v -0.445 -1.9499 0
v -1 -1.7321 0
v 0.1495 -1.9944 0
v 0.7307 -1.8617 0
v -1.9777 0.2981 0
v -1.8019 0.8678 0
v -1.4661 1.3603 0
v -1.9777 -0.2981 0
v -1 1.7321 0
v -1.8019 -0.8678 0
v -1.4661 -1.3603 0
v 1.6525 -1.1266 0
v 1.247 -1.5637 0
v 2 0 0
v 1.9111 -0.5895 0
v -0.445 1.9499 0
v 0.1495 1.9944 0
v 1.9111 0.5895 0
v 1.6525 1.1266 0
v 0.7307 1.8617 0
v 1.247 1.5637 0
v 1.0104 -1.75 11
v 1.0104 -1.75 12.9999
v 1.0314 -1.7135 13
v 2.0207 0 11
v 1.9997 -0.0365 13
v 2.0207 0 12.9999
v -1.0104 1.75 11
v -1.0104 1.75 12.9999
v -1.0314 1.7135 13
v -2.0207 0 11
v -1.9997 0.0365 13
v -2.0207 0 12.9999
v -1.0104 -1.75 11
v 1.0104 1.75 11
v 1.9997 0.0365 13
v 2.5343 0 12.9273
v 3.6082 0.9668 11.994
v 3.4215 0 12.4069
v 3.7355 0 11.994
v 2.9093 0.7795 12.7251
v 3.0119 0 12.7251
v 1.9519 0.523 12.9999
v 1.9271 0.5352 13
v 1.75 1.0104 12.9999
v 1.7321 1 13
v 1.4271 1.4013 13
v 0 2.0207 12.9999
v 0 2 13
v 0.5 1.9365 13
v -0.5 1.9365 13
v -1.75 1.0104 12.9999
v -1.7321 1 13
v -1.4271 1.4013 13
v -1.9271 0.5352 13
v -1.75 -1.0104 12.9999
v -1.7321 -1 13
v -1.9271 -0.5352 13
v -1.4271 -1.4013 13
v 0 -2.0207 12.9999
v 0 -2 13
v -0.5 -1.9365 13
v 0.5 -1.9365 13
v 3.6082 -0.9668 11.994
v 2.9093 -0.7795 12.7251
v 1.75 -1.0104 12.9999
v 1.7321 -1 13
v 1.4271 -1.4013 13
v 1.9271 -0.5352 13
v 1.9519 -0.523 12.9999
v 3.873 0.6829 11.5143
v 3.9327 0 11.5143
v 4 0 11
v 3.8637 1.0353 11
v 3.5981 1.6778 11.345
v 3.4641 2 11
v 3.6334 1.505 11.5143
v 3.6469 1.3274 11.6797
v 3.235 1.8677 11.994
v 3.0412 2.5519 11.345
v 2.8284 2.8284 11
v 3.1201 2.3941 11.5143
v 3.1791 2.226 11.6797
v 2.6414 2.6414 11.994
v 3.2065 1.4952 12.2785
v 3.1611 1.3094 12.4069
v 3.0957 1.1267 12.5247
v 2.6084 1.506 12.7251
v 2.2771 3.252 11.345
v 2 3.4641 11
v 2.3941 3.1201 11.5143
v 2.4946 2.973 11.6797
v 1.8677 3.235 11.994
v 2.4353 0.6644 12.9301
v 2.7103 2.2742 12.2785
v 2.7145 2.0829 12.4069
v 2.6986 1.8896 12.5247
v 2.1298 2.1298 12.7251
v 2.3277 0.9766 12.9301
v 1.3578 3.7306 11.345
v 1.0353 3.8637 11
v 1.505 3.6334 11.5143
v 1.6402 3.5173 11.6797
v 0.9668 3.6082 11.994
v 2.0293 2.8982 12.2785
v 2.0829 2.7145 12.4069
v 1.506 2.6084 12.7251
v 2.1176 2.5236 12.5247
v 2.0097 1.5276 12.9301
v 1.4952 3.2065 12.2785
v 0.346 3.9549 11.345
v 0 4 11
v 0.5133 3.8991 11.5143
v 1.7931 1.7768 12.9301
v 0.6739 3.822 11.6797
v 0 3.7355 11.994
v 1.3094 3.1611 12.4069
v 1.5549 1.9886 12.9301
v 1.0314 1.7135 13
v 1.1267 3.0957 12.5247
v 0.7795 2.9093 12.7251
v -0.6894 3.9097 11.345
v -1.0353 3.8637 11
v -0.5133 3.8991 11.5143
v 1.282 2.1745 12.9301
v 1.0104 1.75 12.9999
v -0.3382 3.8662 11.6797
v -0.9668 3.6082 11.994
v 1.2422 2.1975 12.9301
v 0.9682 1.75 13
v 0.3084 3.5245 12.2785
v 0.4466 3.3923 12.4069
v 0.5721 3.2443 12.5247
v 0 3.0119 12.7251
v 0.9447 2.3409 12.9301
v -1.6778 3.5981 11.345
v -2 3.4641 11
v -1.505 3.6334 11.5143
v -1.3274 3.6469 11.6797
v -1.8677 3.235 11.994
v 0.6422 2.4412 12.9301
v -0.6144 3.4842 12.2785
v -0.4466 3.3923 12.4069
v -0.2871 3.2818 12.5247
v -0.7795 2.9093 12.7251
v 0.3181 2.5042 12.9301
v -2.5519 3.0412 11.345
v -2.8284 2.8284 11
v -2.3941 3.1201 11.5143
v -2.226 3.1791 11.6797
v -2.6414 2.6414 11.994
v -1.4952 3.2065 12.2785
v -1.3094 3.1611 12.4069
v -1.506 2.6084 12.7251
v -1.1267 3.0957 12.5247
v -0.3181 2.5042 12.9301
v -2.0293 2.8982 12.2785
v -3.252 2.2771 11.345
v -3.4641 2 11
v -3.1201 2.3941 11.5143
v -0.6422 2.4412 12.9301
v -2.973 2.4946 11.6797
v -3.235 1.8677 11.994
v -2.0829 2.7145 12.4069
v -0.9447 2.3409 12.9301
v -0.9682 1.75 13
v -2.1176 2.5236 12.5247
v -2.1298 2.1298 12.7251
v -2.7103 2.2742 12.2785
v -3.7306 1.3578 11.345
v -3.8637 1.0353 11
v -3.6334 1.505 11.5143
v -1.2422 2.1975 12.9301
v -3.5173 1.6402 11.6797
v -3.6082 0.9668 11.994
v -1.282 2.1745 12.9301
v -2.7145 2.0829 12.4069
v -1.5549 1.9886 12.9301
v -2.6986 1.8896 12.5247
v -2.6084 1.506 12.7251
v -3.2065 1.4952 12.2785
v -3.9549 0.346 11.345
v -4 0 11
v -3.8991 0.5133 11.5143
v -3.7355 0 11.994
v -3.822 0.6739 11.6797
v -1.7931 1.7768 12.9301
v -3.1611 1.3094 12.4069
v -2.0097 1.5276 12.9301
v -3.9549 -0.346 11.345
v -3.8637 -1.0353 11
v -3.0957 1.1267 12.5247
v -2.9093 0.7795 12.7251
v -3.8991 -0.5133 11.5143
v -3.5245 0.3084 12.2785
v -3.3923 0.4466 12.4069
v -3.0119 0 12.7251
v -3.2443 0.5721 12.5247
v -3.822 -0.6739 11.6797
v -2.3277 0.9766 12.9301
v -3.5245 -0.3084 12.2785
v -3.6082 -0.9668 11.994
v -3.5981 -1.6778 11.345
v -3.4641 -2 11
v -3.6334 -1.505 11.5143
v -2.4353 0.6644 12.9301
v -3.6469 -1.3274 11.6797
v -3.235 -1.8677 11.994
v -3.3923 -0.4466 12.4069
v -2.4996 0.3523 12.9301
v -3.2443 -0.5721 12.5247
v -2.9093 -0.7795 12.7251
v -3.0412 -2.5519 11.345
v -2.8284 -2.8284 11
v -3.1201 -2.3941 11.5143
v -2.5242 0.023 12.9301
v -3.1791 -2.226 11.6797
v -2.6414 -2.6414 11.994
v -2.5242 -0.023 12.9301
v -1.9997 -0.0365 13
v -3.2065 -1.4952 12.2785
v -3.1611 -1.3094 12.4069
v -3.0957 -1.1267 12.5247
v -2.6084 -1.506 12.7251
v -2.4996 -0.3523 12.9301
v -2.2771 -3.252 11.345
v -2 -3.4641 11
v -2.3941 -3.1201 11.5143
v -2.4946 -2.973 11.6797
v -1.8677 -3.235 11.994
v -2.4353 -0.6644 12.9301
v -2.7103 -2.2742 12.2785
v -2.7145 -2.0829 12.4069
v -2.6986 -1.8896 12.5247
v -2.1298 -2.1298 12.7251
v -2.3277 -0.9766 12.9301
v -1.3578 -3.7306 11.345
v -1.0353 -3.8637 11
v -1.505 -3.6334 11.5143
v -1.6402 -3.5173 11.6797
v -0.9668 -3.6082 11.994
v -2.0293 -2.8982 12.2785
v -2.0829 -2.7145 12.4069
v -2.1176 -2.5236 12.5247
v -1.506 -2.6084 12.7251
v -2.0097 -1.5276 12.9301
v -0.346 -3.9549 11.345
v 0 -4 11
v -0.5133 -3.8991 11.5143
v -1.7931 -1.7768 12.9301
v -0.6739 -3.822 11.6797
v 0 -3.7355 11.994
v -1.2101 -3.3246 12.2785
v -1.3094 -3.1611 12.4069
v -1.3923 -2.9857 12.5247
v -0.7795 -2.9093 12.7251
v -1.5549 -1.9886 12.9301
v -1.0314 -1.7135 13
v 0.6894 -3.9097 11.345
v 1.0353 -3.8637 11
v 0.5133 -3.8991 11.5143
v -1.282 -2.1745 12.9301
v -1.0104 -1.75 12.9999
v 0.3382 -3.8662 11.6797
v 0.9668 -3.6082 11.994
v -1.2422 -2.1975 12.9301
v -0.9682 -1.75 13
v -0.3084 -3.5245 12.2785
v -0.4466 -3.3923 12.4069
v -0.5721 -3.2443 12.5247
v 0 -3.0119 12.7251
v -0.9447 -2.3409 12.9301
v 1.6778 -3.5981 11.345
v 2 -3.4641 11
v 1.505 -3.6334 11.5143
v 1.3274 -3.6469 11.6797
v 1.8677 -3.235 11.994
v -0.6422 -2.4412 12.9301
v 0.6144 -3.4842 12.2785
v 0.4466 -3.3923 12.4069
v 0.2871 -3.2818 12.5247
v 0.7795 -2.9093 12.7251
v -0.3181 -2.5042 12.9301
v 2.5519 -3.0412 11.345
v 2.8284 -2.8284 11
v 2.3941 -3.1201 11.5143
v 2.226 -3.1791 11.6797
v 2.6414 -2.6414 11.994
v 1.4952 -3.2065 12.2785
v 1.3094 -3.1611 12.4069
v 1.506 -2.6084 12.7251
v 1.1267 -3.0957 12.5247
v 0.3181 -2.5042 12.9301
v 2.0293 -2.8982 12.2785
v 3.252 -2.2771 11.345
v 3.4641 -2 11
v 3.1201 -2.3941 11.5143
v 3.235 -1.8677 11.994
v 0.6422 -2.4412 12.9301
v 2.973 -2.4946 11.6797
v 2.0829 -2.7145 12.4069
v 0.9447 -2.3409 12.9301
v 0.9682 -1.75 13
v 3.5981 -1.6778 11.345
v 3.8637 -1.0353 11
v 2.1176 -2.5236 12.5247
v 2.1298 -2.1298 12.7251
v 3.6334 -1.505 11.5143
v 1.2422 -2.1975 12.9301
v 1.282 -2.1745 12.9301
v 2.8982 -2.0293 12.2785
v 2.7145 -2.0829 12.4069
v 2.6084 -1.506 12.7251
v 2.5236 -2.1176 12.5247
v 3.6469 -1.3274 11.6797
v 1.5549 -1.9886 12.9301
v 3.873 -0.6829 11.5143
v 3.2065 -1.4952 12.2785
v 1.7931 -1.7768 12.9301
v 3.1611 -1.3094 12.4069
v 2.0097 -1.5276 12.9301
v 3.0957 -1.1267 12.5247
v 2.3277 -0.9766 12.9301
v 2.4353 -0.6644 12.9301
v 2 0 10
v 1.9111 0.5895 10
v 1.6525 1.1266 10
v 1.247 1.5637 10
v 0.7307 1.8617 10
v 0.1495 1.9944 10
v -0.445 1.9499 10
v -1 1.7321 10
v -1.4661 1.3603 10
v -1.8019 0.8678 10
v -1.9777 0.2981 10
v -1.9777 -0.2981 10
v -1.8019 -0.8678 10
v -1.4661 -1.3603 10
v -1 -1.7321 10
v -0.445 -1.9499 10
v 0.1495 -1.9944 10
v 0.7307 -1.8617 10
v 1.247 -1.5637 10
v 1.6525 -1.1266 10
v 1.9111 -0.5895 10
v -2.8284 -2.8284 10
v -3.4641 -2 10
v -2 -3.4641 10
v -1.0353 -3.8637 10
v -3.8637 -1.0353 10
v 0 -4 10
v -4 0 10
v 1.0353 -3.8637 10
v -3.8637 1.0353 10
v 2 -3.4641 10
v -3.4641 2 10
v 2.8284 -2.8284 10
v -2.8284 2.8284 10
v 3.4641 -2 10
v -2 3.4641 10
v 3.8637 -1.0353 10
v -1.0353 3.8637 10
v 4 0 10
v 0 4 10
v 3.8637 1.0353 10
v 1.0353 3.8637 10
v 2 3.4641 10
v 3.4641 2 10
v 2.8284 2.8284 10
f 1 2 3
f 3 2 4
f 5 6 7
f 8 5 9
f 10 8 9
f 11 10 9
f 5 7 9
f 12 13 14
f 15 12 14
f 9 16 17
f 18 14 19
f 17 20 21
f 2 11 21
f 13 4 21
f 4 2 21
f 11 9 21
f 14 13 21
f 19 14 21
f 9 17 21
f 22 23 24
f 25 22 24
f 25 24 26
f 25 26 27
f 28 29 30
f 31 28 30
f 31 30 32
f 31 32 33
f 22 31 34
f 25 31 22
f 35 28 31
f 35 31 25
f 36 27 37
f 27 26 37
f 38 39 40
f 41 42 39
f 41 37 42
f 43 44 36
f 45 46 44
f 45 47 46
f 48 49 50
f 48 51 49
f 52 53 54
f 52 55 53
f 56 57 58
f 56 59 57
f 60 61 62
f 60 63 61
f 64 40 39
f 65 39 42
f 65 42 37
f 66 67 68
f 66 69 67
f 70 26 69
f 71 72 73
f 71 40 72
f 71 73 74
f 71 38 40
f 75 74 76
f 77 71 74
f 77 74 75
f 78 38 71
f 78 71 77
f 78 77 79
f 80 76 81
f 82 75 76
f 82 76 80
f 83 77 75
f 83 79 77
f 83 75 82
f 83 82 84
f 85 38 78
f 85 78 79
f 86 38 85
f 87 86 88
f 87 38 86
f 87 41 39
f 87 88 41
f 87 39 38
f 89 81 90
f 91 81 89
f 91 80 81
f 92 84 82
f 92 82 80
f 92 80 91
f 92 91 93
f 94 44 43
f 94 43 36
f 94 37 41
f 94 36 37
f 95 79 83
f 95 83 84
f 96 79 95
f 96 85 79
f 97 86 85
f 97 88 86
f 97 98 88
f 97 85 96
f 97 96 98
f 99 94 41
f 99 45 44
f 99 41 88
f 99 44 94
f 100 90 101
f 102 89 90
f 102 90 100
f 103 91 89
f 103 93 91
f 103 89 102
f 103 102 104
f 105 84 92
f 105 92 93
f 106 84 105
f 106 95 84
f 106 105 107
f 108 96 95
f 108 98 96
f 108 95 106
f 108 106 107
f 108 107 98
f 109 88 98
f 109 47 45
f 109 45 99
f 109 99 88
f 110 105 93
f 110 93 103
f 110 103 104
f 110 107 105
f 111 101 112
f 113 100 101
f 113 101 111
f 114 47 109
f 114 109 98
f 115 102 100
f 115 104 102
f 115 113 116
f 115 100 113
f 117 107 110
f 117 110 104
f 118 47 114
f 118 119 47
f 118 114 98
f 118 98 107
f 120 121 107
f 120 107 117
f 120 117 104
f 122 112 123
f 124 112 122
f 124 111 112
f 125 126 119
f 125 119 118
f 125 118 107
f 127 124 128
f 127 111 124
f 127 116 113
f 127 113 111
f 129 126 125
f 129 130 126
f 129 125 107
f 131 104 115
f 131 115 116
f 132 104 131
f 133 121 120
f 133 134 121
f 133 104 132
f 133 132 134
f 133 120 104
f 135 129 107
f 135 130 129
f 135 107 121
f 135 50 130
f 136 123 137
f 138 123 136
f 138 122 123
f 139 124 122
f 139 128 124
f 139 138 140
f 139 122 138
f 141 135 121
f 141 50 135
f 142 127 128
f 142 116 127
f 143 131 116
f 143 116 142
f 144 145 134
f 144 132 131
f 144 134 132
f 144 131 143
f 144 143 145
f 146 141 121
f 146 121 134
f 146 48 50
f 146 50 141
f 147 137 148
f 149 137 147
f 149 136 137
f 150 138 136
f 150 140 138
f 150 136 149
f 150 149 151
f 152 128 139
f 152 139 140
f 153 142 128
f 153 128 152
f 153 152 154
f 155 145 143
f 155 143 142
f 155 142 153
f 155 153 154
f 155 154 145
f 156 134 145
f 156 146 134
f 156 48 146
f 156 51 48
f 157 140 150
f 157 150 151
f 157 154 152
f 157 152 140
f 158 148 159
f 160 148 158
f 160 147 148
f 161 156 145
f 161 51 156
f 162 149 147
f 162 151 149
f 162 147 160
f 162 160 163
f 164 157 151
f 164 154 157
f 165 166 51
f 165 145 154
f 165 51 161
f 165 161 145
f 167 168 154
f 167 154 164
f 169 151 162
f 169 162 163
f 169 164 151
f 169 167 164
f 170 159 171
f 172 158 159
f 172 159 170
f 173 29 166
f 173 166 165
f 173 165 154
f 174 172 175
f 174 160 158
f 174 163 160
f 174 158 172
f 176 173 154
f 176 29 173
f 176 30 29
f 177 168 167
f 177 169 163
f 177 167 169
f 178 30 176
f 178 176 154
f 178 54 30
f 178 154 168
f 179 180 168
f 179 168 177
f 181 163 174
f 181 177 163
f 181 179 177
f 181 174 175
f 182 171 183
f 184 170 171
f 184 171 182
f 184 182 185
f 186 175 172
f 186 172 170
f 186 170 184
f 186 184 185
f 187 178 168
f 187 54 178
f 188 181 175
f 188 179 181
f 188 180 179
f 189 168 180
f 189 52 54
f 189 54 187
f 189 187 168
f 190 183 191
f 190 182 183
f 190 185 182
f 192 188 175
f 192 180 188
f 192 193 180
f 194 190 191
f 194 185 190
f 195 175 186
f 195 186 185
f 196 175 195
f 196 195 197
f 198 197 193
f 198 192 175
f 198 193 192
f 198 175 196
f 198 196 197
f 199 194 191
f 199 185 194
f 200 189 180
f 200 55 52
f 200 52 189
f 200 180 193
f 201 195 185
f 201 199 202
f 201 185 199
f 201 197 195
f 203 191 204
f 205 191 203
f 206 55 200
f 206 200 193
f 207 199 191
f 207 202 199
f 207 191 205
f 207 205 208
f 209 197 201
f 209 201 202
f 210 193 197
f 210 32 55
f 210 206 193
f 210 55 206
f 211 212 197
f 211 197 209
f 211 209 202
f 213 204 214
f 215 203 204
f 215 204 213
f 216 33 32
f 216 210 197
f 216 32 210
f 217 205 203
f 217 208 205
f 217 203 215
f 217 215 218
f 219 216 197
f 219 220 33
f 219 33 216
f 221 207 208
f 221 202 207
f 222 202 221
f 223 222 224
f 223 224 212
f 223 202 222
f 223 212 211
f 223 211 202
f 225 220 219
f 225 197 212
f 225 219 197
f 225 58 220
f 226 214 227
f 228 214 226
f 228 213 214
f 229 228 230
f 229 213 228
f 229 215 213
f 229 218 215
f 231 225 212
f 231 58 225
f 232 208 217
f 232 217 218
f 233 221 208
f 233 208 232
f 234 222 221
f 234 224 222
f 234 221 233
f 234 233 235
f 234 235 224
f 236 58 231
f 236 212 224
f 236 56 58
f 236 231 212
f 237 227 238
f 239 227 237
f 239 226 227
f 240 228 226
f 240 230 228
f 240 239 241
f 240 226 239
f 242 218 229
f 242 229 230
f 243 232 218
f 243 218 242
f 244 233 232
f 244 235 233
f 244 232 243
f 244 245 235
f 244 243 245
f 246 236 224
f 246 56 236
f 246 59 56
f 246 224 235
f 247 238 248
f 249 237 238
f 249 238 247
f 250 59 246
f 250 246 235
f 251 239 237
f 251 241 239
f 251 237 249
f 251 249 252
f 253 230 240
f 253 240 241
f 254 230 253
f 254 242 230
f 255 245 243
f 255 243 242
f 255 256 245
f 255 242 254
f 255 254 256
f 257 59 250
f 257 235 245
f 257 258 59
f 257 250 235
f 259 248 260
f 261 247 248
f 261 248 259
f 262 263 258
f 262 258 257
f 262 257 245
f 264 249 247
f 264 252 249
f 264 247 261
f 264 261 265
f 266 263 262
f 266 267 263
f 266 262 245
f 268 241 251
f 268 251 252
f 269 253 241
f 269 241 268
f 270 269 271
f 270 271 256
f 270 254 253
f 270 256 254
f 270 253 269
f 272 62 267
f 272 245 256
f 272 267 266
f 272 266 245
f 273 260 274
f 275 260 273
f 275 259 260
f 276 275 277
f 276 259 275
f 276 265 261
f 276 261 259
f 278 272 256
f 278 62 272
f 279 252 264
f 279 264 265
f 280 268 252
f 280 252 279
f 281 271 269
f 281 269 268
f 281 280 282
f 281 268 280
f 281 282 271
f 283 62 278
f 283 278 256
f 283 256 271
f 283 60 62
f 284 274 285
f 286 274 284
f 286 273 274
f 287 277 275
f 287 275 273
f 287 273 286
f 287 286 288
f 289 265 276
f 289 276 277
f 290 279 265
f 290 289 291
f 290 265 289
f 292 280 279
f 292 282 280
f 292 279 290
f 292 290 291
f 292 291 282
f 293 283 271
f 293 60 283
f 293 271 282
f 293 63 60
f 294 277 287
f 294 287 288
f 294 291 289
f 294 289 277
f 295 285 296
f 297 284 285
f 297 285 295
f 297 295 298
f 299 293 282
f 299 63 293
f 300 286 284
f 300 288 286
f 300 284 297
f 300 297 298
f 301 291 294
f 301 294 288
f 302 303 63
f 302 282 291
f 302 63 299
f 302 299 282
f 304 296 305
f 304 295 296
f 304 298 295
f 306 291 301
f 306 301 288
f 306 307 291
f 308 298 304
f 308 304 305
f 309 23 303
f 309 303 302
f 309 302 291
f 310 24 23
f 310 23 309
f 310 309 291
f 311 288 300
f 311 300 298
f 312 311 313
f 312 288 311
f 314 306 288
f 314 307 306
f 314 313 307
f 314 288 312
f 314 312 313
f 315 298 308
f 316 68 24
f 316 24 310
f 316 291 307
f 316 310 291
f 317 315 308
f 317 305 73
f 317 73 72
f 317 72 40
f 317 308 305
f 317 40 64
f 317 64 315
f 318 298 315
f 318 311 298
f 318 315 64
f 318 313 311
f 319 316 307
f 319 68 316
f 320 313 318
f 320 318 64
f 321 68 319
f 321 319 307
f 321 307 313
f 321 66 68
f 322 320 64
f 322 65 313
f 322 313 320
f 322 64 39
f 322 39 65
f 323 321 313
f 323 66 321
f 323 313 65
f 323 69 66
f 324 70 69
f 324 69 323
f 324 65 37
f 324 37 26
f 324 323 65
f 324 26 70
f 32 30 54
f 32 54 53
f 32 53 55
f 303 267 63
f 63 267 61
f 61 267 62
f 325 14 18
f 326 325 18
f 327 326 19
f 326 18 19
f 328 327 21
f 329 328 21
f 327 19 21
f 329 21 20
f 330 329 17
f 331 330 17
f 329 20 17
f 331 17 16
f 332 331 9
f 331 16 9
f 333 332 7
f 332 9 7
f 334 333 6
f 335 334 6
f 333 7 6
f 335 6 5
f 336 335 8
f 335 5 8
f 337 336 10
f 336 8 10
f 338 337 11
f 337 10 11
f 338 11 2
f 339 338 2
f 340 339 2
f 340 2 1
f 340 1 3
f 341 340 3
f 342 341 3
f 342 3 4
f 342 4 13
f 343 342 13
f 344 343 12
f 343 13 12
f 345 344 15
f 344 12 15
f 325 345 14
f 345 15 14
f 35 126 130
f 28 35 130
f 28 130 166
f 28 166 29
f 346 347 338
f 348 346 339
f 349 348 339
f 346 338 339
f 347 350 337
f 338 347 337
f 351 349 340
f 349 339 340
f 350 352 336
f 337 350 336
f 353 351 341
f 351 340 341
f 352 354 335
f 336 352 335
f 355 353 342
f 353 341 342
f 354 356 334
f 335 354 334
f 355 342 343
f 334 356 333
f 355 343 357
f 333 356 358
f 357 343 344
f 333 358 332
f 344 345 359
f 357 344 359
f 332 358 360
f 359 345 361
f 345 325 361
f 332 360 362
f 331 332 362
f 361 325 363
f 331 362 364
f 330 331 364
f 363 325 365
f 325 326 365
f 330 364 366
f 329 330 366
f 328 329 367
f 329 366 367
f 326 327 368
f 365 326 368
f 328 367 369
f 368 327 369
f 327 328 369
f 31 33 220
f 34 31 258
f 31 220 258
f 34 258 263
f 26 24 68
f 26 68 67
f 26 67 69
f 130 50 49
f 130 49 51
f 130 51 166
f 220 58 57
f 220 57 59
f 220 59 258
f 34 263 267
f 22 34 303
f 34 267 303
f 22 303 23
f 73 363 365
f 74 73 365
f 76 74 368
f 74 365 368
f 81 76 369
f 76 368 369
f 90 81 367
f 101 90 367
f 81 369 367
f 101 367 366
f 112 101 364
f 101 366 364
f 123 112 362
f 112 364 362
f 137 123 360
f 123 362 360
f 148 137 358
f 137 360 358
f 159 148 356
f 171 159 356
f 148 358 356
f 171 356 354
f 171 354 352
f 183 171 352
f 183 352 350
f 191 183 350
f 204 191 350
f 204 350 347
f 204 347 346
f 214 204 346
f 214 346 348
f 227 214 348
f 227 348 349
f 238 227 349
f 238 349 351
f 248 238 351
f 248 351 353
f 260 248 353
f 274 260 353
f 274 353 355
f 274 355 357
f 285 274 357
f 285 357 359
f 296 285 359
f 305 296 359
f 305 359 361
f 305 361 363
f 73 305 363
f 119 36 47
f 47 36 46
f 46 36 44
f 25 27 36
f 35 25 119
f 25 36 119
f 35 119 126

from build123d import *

# Parameters (mm, degrees)
SKETCH_1_R          = 2
EXTRUDE_1_DEPTH     = 10
SKETCH_2_R          = 4
EXTRUDE_2_DEPTH     = 3
CUT_EXTRUDE_1_DEPTH = 2
FILLET_1_R          = 2


with BuildPart() as part:
    # 草图1 → 凸台-拉伸1 (new body)
    with BuildSketch(Plane.XY):
        Circle(SKETCH_1_R)
    extrude(amount=EXTRUDE_1_DEPTH)

    # 草图2 → 凸台-拉伸2 (add)
    with BuildSketch(Plane.XY.offset(10)):
        Circle(SKETCH_2_R)
    extrude(amount=EXTRUDE_2_DEPTH)

    # 草图3 → 切除-拉伸1 (cut)
    with BuildSketch(Plane.XY.offset(13)):
        Polygon((2.020725942, 0), (1.010362971, 1.75), (-1.010362971, 1.75), (-2.020725942, 0), (-1.010362971, -1.75), (1.010362971, -1.75), align=None)
    extrude(amount=-CUT_EXTRUDE_1_DEPTH, mode=Mode.SUBTRACT)

    # 圆角1
    # the kernel refuses this fillet: 2 mm, written as the material it takes off along each edge
    with BuildSketch(Plane(origin=(0, 0, 13), x_dir=(1, 0, 0), z_dir=(0, -1, 0))) as fillet_1_piece_1:
        with BuildLine():
            CenterArc((4 - FILLET_1_R, -FILLET_1_R), FILLET_1_R, 0, 90)
            Line((4 - FILLET_1_R, 0), (4, 0))
            Line((4, 0), (4, -FILLET_1_R))
        make_face()
    revolve(axis=Axis((0, 0, 13), (0, 0, 1)), mode=Mode.SUBTRACT)


solid = part.part
